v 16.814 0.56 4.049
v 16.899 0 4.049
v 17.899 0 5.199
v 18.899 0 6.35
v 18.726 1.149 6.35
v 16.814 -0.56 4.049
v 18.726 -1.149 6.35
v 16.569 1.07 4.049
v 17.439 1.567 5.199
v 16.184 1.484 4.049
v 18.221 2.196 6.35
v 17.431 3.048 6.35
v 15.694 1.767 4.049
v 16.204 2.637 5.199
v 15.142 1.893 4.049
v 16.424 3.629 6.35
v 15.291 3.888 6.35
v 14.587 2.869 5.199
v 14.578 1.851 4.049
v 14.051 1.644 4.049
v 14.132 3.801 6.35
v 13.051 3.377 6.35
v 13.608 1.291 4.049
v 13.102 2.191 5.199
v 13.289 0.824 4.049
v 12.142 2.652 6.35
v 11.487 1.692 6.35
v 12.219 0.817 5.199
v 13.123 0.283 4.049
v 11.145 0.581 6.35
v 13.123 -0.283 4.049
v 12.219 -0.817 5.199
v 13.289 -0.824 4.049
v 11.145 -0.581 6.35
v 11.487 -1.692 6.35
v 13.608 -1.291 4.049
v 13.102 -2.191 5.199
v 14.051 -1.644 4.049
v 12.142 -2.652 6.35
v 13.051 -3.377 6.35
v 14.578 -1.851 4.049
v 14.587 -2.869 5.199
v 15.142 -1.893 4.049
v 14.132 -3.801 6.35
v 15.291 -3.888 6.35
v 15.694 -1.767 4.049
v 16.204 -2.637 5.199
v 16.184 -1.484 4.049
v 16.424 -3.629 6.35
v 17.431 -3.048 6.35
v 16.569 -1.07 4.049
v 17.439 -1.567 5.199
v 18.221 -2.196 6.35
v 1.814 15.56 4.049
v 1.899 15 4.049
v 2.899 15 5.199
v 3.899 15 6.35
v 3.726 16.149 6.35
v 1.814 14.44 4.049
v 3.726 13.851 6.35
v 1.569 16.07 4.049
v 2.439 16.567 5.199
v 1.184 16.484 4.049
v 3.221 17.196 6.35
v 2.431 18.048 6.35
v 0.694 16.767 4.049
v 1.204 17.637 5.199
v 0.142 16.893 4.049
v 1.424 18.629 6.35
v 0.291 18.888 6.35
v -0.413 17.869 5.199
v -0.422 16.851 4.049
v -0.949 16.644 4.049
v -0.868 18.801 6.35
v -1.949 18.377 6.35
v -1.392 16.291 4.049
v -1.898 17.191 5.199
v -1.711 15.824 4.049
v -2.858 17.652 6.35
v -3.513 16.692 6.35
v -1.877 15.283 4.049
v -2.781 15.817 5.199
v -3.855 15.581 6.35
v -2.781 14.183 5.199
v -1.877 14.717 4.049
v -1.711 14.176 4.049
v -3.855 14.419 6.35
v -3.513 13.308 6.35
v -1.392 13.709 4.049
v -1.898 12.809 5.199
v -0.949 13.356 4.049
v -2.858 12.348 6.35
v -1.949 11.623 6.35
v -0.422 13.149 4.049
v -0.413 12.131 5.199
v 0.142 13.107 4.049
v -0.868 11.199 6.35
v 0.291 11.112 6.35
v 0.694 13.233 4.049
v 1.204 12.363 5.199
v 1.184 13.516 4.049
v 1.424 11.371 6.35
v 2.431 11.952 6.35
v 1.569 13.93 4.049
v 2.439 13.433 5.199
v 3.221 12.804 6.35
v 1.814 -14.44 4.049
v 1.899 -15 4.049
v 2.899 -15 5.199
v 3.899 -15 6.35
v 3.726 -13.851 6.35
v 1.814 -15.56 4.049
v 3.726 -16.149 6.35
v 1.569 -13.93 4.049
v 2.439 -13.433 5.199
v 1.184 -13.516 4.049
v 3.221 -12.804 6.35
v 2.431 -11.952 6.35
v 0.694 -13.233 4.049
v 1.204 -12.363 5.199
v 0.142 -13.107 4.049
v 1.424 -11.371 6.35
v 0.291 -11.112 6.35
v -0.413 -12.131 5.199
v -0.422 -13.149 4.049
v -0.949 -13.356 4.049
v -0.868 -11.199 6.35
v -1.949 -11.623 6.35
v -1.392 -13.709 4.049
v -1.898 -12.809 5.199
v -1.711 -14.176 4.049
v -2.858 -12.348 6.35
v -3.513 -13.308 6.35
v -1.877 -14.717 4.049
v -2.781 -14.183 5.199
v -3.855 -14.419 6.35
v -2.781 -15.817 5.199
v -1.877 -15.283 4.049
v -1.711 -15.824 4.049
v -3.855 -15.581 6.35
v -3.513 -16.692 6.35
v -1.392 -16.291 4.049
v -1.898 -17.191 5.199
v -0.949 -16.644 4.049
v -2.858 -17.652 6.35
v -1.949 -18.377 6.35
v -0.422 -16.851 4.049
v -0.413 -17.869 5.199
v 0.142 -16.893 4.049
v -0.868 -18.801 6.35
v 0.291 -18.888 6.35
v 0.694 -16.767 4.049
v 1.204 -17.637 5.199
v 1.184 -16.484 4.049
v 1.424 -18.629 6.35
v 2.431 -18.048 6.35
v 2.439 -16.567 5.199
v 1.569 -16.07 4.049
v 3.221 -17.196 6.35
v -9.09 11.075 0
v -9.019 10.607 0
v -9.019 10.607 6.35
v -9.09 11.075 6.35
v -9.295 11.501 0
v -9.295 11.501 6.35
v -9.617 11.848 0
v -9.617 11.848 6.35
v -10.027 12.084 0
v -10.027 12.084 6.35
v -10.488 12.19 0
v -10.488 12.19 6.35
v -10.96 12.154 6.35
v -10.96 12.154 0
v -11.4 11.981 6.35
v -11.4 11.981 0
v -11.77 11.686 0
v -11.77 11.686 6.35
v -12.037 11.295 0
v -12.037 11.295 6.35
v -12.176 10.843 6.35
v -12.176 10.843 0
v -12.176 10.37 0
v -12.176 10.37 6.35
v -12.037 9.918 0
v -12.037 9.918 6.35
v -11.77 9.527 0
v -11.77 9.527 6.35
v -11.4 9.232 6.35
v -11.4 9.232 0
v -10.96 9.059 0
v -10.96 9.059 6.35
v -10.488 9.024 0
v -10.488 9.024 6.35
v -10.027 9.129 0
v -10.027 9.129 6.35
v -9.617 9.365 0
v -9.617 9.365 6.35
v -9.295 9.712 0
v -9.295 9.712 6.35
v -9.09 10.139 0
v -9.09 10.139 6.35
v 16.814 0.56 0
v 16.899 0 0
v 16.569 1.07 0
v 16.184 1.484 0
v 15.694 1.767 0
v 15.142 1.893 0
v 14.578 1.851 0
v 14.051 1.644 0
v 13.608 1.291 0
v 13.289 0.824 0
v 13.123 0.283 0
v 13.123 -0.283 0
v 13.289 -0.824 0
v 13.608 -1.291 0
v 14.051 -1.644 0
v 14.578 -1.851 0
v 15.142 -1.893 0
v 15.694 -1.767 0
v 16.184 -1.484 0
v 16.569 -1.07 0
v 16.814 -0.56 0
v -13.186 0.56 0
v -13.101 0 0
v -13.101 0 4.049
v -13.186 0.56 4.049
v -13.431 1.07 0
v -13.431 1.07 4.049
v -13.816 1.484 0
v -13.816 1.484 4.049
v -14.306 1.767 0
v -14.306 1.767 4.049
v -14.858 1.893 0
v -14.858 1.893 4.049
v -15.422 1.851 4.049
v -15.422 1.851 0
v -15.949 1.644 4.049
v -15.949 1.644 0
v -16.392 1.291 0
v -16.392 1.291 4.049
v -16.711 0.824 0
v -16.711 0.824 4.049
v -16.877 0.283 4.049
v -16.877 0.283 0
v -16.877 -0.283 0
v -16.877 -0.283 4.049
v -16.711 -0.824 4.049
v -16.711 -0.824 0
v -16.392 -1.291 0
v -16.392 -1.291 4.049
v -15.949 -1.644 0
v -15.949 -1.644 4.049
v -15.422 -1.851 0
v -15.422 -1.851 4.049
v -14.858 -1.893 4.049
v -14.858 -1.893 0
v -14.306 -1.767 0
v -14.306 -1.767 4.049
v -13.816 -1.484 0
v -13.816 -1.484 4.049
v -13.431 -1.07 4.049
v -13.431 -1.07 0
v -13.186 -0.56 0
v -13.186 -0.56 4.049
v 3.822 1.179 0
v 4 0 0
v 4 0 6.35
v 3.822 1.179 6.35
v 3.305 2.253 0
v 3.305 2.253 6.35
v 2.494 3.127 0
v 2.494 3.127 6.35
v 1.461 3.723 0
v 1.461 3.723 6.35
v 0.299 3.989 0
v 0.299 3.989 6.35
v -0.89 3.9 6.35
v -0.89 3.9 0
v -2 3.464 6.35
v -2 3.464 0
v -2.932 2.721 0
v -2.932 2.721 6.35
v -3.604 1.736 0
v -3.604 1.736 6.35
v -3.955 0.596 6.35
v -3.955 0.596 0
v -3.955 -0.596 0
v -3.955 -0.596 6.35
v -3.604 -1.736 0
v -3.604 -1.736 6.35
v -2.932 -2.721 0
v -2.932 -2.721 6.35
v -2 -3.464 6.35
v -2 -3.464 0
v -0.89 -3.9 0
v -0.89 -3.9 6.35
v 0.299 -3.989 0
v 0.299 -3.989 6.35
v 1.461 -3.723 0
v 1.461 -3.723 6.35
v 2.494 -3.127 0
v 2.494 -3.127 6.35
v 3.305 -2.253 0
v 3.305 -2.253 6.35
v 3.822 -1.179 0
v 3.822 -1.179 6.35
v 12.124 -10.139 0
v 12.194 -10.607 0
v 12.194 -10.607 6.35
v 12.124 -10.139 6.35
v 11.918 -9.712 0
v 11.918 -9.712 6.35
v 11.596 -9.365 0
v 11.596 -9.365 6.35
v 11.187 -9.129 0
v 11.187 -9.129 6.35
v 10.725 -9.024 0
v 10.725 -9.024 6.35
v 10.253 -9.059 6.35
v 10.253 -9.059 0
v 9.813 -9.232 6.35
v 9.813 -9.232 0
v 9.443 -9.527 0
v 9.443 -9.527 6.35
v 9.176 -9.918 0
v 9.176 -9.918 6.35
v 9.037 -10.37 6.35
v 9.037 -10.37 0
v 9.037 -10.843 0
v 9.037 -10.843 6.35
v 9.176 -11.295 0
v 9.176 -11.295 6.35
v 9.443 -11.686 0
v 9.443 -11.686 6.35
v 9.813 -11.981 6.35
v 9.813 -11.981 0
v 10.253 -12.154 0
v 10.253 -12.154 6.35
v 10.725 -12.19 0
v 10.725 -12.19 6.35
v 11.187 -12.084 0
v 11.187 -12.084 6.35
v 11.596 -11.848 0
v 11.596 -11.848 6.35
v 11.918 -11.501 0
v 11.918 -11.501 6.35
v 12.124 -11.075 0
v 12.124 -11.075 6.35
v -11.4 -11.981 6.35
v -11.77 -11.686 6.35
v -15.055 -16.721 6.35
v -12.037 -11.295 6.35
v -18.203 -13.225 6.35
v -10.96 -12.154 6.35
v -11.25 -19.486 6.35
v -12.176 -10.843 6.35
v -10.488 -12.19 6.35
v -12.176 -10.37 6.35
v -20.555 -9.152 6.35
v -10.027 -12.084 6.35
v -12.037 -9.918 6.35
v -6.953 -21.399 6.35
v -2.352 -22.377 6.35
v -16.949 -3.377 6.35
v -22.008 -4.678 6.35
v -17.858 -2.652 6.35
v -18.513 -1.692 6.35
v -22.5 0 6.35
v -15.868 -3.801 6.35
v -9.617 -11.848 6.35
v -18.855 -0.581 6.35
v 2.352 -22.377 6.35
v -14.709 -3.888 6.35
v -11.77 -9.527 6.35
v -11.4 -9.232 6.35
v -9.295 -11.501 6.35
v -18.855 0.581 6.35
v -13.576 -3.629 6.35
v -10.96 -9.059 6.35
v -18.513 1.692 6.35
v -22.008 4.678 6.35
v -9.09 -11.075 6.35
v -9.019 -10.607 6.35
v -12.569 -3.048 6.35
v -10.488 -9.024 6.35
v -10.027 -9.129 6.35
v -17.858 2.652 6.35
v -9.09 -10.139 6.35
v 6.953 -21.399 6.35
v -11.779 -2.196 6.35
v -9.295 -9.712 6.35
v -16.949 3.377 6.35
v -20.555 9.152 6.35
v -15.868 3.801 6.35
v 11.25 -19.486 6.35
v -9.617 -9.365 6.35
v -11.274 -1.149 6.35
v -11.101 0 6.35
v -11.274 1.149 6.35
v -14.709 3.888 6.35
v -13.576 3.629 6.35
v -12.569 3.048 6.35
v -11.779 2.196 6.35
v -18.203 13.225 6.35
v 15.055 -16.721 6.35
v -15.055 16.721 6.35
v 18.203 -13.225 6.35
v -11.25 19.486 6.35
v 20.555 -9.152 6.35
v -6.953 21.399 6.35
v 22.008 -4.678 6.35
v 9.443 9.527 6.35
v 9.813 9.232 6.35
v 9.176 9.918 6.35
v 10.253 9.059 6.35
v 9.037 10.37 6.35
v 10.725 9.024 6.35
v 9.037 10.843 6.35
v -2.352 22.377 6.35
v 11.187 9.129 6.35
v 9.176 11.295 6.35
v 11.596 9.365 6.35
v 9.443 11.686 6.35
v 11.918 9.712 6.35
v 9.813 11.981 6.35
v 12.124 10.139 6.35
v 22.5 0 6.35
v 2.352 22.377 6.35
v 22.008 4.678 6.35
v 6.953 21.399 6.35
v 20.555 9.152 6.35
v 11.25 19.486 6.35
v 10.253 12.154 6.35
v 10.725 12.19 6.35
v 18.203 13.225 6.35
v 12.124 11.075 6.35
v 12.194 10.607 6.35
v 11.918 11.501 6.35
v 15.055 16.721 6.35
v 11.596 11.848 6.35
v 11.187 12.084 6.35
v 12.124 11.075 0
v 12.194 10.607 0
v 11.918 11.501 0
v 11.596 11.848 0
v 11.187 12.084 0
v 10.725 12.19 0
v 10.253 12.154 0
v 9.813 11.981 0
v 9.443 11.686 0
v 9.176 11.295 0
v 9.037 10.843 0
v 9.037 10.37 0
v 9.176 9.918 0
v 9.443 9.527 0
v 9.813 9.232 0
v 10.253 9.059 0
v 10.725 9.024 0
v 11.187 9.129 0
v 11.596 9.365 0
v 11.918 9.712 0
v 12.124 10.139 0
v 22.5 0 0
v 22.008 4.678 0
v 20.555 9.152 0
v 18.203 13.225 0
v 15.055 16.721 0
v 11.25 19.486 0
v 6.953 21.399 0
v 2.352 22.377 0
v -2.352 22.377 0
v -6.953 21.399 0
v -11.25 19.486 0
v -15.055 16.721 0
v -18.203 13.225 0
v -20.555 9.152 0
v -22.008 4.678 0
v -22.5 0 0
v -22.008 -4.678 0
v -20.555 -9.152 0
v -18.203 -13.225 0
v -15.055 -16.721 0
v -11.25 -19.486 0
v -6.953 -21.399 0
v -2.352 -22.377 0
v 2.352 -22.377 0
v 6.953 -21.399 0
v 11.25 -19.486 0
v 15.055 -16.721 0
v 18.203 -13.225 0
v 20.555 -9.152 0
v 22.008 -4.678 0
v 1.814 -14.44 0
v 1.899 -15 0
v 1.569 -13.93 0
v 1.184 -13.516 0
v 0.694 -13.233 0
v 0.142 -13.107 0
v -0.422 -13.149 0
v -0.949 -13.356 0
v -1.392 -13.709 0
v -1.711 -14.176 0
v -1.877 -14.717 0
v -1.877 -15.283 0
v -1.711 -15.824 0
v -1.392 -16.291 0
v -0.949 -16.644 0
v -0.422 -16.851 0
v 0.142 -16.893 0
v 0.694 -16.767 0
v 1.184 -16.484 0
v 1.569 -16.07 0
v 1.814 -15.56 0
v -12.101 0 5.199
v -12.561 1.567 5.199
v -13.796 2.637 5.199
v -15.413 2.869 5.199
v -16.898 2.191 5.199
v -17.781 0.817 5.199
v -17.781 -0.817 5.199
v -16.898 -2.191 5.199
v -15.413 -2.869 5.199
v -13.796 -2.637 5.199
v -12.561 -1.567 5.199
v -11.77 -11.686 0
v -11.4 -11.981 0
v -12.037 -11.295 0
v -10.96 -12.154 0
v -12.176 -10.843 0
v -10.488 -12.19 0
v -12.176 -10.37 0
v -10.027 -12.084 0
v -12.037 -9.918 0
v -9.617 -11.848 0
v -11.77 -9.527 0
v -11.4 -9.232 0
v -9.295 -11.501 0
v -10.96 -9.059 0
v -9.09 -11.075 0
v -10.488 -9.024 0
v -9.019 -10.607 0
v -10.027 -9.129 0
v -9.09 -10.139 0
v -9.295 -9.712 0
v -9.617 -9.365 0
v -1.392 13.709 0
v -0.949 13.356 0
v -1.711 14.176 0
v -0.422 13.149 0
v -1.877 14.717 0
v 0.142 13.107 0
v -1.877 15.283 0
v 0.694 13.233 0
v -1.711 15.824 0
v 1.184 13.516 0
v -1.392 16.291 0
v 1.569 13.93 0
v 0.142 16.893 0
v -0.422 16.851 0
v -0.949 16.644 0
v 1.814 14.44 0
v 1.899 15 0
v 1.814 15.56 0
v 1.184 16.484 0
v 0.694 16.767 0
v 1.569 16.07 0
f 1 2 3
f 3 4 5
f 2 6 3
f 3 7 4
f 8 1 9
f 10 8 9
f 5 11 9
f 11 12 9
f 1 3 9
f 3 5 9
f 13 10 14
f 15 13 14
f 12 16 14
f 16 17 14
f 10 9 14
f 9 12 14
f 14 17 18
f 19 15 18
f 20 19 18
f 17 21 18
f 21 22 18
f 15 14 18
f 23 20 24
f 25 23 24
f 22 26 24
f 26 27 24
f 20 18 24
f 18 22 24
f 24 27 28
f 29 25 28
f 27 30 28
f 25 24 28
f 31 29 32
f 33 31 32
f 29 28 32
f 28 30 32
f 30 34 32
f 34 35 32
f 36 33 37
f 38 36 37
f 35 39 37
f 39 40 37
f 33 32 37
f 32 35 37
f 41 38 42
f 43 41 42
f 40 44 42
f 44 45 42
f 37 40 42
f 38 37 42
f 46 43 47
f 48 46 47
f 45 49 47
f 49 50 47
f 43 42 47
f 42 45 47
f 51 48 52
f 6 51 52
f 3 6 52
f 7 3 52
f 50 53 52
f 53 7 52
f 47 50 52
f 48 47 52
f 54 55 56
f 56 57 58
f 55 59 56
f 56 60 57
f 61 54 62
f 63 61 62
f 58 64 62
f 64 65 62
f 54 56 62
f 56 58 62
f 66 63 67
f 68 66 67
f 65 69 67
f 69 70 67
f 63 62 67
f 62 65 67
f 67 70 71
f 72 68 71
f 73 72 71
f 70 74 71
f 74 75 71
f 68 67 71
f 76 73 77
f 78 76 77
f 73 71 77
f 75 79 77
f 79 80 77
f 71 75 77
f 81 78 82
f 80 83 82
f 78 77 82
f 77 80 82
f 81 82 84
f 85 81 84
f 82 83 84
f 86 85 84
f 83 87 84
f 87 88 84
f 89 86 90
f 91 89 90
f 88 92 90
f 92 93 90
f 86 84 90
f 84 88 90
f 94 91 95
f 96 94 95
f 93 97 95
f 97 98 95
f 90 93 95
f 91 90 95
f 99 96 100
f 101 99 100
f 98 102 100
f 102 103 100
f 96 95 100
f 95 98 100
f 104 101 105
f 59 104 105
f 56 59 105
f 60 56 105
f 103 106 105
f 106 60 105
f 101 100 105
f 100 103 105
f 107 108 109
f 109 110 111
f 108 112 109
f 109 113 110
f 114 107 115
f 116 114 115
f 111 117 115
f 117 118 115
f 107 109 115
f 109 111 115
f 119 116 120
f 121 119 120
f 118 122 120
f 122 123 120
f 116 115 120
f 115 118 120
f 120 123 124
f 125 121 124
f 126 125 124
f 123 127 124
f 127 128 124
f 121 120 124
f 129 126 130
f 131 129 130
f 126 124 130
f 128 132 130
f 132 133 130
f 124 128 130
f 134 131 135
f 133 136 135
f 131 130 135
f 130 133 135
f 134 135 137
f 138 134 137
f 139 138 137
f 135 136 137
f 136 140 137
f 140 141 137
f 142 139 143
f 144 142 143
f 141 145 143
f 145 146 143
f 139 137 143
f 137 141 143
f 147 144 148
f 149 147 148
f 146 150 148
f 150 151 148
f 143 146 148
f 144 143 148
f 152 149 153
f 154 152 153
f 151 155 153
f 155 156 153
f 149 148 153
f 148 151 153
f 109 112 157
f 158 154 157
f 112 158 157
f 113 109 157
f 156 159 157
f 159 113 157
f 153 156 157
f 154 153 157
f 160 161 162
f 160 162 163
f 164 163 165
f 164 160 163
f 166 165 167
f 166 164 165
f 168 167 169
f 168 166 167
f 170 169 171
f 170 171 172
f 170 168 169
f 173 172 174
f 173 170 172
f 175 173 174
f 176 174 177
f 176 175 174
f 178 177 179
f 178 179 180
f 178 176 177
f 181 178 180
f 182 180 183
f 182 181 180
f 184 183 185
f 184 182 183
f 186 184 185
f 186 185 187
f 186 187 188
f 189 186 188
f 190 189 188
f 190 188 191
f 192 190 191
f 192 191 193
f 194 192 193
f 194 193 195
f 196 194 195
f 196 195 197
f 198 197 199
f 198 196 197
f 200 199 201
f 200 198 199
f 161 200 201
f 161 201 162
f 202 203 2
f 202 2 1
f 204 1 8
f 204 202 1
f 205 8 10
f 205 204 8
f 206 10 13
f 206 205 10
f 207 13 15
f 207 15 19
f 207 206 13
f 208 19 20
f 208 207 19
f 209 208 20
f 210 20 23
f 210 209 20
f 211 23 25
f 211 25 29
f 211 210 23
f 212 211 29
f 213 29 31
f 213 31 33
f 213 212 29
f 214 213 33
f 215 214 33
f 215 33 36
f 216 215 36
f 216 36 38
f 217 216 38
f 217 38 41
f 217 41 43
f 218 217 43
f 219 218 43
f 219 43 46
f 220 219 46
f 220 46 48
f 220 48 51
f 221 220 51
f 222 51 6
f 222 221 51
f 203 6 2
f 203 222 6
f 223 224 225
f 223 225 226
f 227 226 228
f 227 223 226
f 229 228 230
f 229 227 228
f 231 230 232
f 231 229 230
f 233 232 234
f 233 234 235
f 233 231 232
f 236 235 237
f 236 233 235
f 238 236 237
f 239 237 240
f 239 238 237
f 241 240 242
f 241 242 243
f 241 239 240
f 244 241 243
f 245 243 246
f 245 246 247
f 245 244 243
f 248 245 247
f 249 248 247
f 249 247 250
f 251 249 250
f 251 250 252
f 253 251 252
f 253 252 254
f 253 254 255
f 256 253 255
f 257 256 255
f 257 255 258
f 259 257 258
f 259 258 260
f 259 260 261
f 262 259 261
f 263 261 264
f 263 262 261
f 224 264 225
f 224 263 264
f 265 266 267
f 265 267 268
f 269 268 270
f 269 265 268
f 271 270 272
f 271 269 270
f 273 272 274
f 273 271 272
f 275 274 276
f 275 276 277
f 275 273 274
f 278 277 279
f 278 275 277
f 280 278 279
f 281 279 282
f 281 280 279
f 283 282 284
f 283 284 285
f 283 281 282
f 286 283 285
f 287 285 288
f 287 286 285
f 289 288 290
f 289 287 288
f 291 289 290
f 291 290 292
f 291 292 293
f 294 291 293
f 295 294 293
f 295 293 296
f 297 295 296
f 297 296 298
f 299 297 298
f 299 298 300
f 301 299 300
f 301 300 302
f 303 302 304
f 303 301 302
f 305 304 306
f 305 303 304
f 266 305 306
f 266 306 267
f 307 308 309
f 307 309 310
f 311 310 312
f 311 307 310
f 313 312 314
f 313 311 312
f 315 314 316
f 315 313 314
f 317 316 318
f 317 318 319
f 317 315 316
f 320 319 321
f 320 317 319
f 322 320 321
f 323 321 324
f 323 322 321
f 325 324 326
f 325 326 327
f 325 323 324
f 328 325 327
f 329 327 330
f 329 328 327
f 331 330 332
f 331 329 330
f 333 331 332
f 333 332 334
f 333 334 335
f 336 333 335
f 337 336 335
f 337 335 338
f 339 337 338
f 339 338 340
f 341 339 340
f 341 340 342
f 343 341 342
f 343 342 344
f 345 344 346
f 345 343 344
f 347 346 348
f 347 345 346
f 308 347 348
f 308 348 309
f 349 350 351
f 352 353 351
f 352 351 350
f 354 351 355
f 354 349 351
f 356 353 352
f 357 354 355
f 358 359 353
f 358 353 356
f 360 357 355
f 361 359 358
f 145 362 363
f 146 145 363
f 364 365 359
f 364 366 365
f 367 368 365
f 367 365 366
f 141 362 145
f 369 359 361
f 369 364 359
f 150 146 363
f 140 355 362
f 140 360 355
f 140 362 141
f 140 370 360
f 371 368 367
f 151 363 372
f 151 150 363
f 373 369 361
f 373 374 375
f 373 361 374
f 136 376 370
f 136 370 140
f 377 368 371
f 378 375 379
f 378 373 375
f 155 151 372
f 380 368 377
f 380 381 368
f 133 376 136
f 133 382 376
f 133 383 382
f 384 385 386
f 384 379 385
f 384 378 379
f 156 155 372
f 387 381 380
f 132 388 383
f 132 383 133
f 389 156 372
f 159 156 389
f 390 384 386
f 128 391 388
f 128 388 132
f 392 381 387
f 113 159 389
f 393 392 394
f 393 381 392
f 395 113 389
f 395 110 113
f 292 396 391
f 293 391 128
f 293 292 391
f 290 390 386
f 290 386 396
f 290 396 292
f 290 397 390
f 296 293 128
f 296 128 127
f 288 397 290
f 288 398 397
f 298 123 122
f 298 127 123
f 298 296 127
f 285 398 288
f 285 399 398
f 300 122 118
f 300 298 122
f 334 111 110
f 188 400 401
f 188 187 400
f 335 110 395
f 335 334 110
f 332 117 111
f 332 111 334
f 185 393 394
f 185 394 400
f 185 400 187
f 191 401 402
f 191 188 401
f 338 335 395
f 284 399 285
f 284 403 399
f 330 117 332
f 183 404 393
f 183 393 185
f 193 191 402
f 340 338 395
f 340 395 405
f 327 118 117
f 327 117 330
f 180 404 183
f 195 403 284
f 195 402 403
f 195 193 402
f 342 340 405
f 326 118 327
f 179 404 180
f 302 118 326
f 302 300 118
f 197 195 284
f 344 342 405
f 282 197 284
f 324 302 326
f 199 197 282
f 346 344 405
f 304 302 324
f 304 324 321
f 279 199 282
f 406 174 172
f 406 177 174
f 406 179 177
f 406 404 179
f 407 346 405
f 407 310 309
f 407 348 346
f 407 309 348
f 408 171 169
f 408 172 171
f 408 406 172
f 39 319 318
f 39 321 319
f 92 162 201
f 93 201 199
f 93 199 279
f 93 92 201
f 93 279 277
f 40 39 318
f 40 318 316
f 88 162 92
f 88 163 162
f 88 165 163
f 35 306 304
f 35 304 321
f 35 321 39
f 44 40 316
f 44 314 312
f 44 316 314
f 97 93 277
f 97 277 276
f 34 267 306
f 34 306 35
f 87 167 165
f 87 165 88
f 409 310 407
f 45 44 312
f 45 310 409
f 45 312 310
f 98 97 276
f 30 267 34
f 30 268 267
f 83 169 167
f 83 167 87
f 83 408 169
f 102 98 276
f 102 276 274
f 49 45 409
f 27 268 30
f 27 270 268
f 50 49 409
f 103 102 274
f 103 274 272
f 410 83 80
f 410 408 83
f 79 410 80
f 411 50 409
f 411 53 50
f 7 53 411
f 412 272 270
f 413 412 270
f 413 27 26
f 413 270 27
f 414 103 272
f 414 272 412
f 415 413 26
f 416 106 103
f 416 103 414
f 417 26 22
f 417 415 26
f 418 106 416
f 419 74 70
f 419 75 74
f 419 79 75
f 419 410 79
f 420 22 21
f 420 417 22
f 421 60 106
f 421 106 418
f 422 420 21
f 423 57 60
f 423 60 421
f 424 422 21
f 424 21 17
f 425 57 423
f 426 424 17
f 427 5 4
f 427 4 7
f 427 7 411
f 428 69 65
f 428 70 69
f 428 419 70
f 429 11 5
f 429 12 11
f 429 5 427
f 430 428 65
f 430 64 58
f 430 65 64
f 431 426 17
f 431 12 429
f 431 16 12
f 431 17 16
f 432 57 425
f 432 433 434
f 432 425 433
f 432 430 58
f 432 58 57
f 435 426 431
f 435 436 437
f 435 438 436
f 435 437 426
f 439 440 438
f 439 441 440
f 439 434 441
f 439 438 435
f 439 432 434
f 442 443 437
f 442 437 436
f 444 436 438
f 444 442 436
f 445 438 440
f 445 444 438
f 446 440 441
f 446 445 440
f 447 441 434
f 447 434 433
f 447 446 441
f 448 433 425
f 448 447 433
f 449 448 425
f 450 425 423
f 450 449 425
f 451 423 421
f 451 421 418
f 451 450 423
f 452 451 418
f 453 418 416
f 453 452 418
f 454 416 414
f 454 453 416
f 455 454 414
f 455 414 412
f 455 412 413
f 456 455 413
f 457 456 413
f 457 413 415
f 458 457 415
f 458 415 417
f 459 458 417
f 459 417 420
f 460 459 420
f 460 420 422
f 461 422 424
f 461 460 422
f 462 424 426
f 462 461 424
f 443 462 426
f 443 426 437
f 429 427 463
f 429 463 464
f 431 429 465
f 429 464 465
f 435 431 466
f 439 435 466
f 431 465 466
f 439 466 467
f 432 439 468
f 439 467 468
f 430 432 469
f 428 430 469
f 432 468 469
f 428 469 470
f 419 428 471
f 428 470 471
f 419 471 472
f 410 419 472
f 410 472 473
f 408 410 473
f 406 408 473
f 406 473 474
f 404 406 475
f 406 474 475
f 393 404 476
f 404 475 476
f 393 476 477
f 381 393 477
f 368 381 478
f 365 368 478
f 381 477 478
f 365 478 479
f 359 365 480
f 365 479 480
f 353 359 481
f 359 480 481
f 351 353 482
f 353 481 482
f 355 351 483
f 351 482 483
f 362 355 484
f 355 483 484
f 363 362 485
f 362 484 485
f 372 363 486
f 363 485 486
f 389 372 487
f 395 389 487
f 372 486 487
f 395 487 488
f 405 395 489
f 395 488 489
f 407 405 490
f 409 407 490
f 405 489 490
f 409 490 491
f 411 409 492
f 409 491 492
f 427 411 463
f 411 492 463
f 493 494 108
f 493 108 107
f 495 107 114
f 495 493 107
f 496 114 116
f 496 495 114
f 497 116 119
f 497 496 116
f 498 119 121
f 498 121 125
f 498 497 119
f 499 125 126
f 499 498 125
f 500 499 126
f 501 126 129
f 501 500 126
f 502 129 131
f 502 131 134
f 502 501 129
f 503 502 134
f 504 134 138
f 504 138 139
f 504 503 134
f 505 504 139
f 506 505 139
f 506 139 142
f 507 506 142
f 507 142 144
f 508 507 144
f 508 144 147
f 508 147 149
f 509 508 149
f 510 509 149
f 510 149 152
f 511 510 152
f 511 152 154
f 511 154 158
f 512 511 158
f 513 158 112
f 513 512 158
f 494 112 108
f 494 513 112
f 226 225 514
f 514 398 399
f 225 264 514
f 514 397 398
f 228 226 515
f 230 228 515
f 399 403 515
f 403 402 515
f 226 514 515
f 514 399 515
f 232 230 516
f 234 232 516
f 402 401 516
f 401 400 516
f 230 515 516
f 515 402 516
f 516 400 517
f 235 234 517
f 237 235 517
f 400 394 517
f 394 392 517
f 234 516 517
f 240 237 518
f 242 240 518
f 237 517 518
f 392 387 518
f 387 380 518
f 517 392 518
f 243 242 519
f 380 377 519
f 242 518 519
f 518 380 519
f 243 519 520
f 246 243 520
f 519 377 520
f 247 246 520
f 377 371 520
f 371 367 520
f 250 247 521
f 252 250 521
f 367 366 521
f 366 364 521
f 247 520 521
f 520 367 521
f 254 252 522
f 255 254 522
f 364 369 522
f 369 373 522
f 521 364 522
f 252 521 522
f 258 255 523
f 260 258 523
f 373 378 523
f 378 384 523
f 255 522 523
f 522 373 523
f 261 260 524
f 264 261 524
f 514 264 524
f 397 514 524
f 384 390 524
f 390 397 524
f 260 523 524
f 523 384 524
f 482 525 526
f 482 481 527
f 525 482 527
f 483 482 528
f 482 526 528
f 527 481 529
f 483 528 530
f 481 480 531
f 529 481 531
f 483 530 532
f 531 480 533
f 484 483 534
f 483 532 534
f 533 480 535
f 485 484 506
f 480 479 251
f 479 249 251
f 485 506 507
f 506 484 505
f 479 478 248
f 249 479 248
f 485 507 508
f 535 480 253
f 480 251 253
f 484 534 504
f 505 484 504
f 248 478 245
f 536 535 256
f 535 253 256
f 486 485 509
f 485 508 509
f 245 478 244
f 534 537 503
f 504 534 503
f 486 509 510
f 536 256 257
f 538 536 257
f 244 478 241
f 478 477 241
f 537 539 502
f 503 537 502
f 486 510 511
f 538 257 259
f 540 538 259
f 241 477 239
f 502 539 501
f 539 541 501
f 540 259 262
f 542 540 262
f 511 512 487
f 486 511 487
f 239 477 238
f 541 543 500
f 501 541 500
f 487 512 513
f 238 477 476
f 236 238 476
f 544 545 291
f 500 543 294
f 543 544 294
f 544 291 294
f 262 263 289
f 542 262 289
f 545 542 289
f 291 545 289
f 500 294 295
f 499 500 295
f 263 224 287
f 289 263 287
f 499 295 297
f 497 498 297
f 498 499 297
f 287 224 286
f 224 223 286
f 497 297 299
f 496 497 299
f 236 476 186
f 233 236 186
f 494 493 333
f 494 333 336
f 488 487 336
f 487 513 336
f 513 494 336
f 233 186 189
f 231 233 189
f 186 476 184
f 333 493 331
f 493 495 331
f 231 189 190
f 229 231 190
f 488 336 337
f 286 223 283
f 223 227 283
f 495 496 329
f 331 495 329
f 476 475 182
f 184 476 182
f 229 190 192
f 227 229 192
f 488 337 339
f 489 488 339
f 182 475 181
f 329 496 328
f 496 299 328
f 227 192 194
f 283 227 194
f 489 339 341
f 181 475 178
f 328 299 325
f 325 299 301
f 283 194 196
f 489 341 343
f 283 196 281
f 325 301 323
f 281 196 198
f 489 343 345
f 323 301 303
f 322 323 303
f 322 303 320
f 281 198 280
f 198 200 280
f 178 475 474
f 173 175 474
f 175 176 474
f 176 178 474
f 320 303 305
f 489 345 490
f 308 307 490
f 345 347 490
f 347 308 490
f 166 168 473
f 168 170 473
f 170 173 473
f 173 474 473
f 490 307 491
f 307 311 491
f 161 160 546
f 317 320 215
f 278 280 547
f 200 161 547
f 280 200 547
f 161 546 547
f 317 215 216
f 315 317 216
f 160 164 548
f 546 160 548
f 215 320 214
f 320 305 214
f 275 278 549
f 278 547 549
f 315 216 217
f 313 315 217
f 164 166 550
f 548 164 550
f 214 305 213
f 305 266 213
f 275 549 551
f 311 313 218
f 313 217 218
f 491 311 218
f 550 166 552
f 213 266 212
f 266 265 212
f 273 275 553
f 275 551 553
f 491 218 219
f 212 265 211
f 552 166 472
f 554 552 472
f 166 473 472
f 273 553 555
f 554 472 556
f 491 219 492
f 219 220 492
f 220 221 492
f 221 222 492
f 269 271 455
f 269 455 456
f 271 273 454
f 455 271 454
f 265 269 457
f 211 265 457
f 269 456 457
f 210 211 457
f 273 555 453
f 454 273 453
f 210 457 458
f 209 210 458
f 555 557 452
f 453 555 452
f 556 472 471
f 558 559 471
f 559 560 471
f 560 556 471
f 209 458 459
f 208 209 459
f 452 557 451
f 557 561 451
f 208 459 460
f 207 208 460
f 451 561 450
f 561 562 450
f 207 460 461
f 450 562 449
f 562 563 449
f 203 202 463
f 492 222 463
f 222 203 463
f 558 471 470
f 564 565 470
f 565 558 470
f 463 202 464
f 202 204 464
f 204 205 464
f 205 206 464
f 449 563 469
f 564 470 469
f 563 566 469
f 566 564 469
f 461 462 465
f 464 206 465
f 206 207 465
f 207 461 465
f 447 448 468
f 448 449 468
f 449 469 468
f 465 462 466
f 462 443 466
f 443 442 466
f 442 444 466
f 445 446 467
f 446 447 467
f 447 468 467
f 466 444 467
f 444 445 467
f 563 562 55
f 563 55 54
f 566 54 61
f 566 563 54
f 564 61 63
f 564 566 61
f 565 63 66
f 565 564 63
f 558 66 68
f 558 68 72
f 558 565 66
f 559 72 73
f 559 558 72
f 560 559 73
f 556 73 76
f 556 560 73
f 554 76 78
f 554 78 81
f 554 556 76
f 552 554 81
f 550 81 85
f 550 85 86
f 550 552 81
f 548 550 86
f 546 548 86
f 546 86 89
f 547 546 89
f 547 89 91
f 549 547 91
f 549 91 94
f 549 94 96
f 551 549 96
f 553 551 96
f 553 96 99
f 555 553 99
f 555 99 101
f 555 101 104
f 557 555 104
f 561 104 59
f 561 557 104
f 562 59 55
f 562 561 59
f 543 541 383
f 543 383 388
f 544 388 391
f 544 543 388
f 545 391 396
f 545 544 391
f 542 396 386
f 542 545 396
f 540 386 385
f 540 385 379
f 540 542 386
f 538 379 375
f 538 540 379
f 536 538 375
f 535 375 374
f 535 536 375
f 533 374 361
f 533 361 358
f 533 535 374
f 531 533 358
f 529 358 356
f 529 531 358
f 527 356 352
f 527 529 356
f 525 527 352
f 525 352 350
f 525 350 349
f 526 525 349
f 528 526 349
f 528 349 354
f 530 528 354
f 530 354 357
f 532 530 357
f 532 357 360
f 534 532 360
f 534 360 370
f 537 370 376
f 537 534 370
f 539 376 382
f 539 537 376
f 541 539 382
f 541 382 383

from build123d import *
from OCP.BRepFilletAPI import BRepFilletAPI_MakeChamfer

# Parameters (mm, degrees)
SKETCH1_R           = 22.5
SKETCH1_R_2         = 4
SKETCH1_R_3         = 1.89865
SKETCH1_R_4         = 1.5875
BOSS_EXTRUDE1_DEPTH = 6.35
CHAMFER1_SIZE       = 2.301024407
CHAMFER1_SIZE2      = 2.00025


with BuildPart() as part:
    # Sketch1 → Boss-Extrude1 (new body)
    with BuildSketch(Plane.XY):
        Circle(SKETCH1_R)
        Circle(SKETCH1_R_2, mode=Mode.SUBTRACT)
        with Locations((0, 15)):
            Circle(SKETCH1_R_3, mode=Mode.SUBTRACT)
        with Locations((10.606601718, 10.606601718)):
            Circle(SKETCH1_R_4, mode=Mode.SUBTRACT)
        with Locations((15, 0)):
            Circle(SKETCH1_R_3, mode=Mode.SUBTRACT)
        with Locations((10.606601718, -10.606601718)):
            Circle(SKETCH1_R_4, mode=Mode.SUBTRACT)
        with Locations((0, -15)):
            Circle(SKETCH1_R_3, mode=Mode.SUBTRACT)
        with Locations((-10.606601718, -10.606601718)):
            Circle(SKETCH1_R_4, mode=Mode.SUBTRACT)
        with Locations((-15, 0)):
            Circle(SKETCH1_R_3, mode=Mode.SUBTRACT)
        with Locations((-10.606601718, 10.606601718)):
            Circle(SKETCH1_R_4, mode=Mode.SUBTRACT)
    extrude(amount=BOSS_EXTRUDE1_DEPTH)

    # Chamfer1: one chamfer whose edges measure the first distance from different faces: ONE call of the kernel's chamfer builder (chamfer() names one face for all edges)
    chamfer1_edges_1 = [part.edges().sort_by_distance(p)[0] for p in [
        (13.10135, 0, 6.35),
    ]]
    chamfer1_side_1 = [part.faces().sort_by_distance(p)[0] for p in [
        (13.10135, 0, 3.175),
    ]]
    chamfer1_edges_2 = [part.edges().sort_by_distance(p)[0] for p in [
        (-1.89865, -15, 6.35),
    ]]
    chamfer1_side_2 = [part.faces().sort_by_distance(p)[0] for p in [
        (-1.89865, -15, 3.175),
    ]]
    chamfer1_edges_3 = [part.edges().sort_by_distance(p)[0] for p in [
        (-16.89865, 0, 6.35),
    ]]
    chamfer1_side_3 = [part.faces().sort_by_distance(p)[0] for p in [
        (-16.89865, 0, 3.175),
    ]]
    chamfer1_edges_4 = [part.edges().sort_by_distance(p)[0] for p in [
        (-1.89865, 15, 6.35),
    ]]
    chamfer1_side_4 = [part.faces().sort_by_distance(p)[0] for p in [
        (-1.89865, 15, 3.175),
    ]]
    chamfer1 = BRepFilletAPI_MakeChamfer(part.part.solid().wrapped)
    for e in chamfer1_edges_1:
        chamfer1.Add(CHAMFER1_SIZE, CHAMFER1_SIZE2, e.wrapped, chamfer1_side_1[0].wrapped)  # the first distance lies on this face
    for e in chamfer1_edges_2:
        chamfer1.Add(CHAMFER1_SIZE, CHAMFER1_SIZE2, e.wrapped, chamfer1_side_2[0].wrapped)  # the first distance lies on this face
    for e in chamfer1_edges_3:
        chamfer1.Add(CHAMFER1_SIZE, CHAMFER1_SIZE2, e.wrapped, chamfer1_side_3[0].wrapped)  # the first distance lies on this face
    for e in chamfer1_edges_4:
        chamfer1.Add(CHAMFER1_SIZE, CHAMFER1_SIZE2, e.wrapped, chamfer1_side_4[0].wrapped)  # the first distance lies on this face
    add(Compound.cast(chamfer1.Shape()), mode=Mode.REPLACE)


solid = part.part
